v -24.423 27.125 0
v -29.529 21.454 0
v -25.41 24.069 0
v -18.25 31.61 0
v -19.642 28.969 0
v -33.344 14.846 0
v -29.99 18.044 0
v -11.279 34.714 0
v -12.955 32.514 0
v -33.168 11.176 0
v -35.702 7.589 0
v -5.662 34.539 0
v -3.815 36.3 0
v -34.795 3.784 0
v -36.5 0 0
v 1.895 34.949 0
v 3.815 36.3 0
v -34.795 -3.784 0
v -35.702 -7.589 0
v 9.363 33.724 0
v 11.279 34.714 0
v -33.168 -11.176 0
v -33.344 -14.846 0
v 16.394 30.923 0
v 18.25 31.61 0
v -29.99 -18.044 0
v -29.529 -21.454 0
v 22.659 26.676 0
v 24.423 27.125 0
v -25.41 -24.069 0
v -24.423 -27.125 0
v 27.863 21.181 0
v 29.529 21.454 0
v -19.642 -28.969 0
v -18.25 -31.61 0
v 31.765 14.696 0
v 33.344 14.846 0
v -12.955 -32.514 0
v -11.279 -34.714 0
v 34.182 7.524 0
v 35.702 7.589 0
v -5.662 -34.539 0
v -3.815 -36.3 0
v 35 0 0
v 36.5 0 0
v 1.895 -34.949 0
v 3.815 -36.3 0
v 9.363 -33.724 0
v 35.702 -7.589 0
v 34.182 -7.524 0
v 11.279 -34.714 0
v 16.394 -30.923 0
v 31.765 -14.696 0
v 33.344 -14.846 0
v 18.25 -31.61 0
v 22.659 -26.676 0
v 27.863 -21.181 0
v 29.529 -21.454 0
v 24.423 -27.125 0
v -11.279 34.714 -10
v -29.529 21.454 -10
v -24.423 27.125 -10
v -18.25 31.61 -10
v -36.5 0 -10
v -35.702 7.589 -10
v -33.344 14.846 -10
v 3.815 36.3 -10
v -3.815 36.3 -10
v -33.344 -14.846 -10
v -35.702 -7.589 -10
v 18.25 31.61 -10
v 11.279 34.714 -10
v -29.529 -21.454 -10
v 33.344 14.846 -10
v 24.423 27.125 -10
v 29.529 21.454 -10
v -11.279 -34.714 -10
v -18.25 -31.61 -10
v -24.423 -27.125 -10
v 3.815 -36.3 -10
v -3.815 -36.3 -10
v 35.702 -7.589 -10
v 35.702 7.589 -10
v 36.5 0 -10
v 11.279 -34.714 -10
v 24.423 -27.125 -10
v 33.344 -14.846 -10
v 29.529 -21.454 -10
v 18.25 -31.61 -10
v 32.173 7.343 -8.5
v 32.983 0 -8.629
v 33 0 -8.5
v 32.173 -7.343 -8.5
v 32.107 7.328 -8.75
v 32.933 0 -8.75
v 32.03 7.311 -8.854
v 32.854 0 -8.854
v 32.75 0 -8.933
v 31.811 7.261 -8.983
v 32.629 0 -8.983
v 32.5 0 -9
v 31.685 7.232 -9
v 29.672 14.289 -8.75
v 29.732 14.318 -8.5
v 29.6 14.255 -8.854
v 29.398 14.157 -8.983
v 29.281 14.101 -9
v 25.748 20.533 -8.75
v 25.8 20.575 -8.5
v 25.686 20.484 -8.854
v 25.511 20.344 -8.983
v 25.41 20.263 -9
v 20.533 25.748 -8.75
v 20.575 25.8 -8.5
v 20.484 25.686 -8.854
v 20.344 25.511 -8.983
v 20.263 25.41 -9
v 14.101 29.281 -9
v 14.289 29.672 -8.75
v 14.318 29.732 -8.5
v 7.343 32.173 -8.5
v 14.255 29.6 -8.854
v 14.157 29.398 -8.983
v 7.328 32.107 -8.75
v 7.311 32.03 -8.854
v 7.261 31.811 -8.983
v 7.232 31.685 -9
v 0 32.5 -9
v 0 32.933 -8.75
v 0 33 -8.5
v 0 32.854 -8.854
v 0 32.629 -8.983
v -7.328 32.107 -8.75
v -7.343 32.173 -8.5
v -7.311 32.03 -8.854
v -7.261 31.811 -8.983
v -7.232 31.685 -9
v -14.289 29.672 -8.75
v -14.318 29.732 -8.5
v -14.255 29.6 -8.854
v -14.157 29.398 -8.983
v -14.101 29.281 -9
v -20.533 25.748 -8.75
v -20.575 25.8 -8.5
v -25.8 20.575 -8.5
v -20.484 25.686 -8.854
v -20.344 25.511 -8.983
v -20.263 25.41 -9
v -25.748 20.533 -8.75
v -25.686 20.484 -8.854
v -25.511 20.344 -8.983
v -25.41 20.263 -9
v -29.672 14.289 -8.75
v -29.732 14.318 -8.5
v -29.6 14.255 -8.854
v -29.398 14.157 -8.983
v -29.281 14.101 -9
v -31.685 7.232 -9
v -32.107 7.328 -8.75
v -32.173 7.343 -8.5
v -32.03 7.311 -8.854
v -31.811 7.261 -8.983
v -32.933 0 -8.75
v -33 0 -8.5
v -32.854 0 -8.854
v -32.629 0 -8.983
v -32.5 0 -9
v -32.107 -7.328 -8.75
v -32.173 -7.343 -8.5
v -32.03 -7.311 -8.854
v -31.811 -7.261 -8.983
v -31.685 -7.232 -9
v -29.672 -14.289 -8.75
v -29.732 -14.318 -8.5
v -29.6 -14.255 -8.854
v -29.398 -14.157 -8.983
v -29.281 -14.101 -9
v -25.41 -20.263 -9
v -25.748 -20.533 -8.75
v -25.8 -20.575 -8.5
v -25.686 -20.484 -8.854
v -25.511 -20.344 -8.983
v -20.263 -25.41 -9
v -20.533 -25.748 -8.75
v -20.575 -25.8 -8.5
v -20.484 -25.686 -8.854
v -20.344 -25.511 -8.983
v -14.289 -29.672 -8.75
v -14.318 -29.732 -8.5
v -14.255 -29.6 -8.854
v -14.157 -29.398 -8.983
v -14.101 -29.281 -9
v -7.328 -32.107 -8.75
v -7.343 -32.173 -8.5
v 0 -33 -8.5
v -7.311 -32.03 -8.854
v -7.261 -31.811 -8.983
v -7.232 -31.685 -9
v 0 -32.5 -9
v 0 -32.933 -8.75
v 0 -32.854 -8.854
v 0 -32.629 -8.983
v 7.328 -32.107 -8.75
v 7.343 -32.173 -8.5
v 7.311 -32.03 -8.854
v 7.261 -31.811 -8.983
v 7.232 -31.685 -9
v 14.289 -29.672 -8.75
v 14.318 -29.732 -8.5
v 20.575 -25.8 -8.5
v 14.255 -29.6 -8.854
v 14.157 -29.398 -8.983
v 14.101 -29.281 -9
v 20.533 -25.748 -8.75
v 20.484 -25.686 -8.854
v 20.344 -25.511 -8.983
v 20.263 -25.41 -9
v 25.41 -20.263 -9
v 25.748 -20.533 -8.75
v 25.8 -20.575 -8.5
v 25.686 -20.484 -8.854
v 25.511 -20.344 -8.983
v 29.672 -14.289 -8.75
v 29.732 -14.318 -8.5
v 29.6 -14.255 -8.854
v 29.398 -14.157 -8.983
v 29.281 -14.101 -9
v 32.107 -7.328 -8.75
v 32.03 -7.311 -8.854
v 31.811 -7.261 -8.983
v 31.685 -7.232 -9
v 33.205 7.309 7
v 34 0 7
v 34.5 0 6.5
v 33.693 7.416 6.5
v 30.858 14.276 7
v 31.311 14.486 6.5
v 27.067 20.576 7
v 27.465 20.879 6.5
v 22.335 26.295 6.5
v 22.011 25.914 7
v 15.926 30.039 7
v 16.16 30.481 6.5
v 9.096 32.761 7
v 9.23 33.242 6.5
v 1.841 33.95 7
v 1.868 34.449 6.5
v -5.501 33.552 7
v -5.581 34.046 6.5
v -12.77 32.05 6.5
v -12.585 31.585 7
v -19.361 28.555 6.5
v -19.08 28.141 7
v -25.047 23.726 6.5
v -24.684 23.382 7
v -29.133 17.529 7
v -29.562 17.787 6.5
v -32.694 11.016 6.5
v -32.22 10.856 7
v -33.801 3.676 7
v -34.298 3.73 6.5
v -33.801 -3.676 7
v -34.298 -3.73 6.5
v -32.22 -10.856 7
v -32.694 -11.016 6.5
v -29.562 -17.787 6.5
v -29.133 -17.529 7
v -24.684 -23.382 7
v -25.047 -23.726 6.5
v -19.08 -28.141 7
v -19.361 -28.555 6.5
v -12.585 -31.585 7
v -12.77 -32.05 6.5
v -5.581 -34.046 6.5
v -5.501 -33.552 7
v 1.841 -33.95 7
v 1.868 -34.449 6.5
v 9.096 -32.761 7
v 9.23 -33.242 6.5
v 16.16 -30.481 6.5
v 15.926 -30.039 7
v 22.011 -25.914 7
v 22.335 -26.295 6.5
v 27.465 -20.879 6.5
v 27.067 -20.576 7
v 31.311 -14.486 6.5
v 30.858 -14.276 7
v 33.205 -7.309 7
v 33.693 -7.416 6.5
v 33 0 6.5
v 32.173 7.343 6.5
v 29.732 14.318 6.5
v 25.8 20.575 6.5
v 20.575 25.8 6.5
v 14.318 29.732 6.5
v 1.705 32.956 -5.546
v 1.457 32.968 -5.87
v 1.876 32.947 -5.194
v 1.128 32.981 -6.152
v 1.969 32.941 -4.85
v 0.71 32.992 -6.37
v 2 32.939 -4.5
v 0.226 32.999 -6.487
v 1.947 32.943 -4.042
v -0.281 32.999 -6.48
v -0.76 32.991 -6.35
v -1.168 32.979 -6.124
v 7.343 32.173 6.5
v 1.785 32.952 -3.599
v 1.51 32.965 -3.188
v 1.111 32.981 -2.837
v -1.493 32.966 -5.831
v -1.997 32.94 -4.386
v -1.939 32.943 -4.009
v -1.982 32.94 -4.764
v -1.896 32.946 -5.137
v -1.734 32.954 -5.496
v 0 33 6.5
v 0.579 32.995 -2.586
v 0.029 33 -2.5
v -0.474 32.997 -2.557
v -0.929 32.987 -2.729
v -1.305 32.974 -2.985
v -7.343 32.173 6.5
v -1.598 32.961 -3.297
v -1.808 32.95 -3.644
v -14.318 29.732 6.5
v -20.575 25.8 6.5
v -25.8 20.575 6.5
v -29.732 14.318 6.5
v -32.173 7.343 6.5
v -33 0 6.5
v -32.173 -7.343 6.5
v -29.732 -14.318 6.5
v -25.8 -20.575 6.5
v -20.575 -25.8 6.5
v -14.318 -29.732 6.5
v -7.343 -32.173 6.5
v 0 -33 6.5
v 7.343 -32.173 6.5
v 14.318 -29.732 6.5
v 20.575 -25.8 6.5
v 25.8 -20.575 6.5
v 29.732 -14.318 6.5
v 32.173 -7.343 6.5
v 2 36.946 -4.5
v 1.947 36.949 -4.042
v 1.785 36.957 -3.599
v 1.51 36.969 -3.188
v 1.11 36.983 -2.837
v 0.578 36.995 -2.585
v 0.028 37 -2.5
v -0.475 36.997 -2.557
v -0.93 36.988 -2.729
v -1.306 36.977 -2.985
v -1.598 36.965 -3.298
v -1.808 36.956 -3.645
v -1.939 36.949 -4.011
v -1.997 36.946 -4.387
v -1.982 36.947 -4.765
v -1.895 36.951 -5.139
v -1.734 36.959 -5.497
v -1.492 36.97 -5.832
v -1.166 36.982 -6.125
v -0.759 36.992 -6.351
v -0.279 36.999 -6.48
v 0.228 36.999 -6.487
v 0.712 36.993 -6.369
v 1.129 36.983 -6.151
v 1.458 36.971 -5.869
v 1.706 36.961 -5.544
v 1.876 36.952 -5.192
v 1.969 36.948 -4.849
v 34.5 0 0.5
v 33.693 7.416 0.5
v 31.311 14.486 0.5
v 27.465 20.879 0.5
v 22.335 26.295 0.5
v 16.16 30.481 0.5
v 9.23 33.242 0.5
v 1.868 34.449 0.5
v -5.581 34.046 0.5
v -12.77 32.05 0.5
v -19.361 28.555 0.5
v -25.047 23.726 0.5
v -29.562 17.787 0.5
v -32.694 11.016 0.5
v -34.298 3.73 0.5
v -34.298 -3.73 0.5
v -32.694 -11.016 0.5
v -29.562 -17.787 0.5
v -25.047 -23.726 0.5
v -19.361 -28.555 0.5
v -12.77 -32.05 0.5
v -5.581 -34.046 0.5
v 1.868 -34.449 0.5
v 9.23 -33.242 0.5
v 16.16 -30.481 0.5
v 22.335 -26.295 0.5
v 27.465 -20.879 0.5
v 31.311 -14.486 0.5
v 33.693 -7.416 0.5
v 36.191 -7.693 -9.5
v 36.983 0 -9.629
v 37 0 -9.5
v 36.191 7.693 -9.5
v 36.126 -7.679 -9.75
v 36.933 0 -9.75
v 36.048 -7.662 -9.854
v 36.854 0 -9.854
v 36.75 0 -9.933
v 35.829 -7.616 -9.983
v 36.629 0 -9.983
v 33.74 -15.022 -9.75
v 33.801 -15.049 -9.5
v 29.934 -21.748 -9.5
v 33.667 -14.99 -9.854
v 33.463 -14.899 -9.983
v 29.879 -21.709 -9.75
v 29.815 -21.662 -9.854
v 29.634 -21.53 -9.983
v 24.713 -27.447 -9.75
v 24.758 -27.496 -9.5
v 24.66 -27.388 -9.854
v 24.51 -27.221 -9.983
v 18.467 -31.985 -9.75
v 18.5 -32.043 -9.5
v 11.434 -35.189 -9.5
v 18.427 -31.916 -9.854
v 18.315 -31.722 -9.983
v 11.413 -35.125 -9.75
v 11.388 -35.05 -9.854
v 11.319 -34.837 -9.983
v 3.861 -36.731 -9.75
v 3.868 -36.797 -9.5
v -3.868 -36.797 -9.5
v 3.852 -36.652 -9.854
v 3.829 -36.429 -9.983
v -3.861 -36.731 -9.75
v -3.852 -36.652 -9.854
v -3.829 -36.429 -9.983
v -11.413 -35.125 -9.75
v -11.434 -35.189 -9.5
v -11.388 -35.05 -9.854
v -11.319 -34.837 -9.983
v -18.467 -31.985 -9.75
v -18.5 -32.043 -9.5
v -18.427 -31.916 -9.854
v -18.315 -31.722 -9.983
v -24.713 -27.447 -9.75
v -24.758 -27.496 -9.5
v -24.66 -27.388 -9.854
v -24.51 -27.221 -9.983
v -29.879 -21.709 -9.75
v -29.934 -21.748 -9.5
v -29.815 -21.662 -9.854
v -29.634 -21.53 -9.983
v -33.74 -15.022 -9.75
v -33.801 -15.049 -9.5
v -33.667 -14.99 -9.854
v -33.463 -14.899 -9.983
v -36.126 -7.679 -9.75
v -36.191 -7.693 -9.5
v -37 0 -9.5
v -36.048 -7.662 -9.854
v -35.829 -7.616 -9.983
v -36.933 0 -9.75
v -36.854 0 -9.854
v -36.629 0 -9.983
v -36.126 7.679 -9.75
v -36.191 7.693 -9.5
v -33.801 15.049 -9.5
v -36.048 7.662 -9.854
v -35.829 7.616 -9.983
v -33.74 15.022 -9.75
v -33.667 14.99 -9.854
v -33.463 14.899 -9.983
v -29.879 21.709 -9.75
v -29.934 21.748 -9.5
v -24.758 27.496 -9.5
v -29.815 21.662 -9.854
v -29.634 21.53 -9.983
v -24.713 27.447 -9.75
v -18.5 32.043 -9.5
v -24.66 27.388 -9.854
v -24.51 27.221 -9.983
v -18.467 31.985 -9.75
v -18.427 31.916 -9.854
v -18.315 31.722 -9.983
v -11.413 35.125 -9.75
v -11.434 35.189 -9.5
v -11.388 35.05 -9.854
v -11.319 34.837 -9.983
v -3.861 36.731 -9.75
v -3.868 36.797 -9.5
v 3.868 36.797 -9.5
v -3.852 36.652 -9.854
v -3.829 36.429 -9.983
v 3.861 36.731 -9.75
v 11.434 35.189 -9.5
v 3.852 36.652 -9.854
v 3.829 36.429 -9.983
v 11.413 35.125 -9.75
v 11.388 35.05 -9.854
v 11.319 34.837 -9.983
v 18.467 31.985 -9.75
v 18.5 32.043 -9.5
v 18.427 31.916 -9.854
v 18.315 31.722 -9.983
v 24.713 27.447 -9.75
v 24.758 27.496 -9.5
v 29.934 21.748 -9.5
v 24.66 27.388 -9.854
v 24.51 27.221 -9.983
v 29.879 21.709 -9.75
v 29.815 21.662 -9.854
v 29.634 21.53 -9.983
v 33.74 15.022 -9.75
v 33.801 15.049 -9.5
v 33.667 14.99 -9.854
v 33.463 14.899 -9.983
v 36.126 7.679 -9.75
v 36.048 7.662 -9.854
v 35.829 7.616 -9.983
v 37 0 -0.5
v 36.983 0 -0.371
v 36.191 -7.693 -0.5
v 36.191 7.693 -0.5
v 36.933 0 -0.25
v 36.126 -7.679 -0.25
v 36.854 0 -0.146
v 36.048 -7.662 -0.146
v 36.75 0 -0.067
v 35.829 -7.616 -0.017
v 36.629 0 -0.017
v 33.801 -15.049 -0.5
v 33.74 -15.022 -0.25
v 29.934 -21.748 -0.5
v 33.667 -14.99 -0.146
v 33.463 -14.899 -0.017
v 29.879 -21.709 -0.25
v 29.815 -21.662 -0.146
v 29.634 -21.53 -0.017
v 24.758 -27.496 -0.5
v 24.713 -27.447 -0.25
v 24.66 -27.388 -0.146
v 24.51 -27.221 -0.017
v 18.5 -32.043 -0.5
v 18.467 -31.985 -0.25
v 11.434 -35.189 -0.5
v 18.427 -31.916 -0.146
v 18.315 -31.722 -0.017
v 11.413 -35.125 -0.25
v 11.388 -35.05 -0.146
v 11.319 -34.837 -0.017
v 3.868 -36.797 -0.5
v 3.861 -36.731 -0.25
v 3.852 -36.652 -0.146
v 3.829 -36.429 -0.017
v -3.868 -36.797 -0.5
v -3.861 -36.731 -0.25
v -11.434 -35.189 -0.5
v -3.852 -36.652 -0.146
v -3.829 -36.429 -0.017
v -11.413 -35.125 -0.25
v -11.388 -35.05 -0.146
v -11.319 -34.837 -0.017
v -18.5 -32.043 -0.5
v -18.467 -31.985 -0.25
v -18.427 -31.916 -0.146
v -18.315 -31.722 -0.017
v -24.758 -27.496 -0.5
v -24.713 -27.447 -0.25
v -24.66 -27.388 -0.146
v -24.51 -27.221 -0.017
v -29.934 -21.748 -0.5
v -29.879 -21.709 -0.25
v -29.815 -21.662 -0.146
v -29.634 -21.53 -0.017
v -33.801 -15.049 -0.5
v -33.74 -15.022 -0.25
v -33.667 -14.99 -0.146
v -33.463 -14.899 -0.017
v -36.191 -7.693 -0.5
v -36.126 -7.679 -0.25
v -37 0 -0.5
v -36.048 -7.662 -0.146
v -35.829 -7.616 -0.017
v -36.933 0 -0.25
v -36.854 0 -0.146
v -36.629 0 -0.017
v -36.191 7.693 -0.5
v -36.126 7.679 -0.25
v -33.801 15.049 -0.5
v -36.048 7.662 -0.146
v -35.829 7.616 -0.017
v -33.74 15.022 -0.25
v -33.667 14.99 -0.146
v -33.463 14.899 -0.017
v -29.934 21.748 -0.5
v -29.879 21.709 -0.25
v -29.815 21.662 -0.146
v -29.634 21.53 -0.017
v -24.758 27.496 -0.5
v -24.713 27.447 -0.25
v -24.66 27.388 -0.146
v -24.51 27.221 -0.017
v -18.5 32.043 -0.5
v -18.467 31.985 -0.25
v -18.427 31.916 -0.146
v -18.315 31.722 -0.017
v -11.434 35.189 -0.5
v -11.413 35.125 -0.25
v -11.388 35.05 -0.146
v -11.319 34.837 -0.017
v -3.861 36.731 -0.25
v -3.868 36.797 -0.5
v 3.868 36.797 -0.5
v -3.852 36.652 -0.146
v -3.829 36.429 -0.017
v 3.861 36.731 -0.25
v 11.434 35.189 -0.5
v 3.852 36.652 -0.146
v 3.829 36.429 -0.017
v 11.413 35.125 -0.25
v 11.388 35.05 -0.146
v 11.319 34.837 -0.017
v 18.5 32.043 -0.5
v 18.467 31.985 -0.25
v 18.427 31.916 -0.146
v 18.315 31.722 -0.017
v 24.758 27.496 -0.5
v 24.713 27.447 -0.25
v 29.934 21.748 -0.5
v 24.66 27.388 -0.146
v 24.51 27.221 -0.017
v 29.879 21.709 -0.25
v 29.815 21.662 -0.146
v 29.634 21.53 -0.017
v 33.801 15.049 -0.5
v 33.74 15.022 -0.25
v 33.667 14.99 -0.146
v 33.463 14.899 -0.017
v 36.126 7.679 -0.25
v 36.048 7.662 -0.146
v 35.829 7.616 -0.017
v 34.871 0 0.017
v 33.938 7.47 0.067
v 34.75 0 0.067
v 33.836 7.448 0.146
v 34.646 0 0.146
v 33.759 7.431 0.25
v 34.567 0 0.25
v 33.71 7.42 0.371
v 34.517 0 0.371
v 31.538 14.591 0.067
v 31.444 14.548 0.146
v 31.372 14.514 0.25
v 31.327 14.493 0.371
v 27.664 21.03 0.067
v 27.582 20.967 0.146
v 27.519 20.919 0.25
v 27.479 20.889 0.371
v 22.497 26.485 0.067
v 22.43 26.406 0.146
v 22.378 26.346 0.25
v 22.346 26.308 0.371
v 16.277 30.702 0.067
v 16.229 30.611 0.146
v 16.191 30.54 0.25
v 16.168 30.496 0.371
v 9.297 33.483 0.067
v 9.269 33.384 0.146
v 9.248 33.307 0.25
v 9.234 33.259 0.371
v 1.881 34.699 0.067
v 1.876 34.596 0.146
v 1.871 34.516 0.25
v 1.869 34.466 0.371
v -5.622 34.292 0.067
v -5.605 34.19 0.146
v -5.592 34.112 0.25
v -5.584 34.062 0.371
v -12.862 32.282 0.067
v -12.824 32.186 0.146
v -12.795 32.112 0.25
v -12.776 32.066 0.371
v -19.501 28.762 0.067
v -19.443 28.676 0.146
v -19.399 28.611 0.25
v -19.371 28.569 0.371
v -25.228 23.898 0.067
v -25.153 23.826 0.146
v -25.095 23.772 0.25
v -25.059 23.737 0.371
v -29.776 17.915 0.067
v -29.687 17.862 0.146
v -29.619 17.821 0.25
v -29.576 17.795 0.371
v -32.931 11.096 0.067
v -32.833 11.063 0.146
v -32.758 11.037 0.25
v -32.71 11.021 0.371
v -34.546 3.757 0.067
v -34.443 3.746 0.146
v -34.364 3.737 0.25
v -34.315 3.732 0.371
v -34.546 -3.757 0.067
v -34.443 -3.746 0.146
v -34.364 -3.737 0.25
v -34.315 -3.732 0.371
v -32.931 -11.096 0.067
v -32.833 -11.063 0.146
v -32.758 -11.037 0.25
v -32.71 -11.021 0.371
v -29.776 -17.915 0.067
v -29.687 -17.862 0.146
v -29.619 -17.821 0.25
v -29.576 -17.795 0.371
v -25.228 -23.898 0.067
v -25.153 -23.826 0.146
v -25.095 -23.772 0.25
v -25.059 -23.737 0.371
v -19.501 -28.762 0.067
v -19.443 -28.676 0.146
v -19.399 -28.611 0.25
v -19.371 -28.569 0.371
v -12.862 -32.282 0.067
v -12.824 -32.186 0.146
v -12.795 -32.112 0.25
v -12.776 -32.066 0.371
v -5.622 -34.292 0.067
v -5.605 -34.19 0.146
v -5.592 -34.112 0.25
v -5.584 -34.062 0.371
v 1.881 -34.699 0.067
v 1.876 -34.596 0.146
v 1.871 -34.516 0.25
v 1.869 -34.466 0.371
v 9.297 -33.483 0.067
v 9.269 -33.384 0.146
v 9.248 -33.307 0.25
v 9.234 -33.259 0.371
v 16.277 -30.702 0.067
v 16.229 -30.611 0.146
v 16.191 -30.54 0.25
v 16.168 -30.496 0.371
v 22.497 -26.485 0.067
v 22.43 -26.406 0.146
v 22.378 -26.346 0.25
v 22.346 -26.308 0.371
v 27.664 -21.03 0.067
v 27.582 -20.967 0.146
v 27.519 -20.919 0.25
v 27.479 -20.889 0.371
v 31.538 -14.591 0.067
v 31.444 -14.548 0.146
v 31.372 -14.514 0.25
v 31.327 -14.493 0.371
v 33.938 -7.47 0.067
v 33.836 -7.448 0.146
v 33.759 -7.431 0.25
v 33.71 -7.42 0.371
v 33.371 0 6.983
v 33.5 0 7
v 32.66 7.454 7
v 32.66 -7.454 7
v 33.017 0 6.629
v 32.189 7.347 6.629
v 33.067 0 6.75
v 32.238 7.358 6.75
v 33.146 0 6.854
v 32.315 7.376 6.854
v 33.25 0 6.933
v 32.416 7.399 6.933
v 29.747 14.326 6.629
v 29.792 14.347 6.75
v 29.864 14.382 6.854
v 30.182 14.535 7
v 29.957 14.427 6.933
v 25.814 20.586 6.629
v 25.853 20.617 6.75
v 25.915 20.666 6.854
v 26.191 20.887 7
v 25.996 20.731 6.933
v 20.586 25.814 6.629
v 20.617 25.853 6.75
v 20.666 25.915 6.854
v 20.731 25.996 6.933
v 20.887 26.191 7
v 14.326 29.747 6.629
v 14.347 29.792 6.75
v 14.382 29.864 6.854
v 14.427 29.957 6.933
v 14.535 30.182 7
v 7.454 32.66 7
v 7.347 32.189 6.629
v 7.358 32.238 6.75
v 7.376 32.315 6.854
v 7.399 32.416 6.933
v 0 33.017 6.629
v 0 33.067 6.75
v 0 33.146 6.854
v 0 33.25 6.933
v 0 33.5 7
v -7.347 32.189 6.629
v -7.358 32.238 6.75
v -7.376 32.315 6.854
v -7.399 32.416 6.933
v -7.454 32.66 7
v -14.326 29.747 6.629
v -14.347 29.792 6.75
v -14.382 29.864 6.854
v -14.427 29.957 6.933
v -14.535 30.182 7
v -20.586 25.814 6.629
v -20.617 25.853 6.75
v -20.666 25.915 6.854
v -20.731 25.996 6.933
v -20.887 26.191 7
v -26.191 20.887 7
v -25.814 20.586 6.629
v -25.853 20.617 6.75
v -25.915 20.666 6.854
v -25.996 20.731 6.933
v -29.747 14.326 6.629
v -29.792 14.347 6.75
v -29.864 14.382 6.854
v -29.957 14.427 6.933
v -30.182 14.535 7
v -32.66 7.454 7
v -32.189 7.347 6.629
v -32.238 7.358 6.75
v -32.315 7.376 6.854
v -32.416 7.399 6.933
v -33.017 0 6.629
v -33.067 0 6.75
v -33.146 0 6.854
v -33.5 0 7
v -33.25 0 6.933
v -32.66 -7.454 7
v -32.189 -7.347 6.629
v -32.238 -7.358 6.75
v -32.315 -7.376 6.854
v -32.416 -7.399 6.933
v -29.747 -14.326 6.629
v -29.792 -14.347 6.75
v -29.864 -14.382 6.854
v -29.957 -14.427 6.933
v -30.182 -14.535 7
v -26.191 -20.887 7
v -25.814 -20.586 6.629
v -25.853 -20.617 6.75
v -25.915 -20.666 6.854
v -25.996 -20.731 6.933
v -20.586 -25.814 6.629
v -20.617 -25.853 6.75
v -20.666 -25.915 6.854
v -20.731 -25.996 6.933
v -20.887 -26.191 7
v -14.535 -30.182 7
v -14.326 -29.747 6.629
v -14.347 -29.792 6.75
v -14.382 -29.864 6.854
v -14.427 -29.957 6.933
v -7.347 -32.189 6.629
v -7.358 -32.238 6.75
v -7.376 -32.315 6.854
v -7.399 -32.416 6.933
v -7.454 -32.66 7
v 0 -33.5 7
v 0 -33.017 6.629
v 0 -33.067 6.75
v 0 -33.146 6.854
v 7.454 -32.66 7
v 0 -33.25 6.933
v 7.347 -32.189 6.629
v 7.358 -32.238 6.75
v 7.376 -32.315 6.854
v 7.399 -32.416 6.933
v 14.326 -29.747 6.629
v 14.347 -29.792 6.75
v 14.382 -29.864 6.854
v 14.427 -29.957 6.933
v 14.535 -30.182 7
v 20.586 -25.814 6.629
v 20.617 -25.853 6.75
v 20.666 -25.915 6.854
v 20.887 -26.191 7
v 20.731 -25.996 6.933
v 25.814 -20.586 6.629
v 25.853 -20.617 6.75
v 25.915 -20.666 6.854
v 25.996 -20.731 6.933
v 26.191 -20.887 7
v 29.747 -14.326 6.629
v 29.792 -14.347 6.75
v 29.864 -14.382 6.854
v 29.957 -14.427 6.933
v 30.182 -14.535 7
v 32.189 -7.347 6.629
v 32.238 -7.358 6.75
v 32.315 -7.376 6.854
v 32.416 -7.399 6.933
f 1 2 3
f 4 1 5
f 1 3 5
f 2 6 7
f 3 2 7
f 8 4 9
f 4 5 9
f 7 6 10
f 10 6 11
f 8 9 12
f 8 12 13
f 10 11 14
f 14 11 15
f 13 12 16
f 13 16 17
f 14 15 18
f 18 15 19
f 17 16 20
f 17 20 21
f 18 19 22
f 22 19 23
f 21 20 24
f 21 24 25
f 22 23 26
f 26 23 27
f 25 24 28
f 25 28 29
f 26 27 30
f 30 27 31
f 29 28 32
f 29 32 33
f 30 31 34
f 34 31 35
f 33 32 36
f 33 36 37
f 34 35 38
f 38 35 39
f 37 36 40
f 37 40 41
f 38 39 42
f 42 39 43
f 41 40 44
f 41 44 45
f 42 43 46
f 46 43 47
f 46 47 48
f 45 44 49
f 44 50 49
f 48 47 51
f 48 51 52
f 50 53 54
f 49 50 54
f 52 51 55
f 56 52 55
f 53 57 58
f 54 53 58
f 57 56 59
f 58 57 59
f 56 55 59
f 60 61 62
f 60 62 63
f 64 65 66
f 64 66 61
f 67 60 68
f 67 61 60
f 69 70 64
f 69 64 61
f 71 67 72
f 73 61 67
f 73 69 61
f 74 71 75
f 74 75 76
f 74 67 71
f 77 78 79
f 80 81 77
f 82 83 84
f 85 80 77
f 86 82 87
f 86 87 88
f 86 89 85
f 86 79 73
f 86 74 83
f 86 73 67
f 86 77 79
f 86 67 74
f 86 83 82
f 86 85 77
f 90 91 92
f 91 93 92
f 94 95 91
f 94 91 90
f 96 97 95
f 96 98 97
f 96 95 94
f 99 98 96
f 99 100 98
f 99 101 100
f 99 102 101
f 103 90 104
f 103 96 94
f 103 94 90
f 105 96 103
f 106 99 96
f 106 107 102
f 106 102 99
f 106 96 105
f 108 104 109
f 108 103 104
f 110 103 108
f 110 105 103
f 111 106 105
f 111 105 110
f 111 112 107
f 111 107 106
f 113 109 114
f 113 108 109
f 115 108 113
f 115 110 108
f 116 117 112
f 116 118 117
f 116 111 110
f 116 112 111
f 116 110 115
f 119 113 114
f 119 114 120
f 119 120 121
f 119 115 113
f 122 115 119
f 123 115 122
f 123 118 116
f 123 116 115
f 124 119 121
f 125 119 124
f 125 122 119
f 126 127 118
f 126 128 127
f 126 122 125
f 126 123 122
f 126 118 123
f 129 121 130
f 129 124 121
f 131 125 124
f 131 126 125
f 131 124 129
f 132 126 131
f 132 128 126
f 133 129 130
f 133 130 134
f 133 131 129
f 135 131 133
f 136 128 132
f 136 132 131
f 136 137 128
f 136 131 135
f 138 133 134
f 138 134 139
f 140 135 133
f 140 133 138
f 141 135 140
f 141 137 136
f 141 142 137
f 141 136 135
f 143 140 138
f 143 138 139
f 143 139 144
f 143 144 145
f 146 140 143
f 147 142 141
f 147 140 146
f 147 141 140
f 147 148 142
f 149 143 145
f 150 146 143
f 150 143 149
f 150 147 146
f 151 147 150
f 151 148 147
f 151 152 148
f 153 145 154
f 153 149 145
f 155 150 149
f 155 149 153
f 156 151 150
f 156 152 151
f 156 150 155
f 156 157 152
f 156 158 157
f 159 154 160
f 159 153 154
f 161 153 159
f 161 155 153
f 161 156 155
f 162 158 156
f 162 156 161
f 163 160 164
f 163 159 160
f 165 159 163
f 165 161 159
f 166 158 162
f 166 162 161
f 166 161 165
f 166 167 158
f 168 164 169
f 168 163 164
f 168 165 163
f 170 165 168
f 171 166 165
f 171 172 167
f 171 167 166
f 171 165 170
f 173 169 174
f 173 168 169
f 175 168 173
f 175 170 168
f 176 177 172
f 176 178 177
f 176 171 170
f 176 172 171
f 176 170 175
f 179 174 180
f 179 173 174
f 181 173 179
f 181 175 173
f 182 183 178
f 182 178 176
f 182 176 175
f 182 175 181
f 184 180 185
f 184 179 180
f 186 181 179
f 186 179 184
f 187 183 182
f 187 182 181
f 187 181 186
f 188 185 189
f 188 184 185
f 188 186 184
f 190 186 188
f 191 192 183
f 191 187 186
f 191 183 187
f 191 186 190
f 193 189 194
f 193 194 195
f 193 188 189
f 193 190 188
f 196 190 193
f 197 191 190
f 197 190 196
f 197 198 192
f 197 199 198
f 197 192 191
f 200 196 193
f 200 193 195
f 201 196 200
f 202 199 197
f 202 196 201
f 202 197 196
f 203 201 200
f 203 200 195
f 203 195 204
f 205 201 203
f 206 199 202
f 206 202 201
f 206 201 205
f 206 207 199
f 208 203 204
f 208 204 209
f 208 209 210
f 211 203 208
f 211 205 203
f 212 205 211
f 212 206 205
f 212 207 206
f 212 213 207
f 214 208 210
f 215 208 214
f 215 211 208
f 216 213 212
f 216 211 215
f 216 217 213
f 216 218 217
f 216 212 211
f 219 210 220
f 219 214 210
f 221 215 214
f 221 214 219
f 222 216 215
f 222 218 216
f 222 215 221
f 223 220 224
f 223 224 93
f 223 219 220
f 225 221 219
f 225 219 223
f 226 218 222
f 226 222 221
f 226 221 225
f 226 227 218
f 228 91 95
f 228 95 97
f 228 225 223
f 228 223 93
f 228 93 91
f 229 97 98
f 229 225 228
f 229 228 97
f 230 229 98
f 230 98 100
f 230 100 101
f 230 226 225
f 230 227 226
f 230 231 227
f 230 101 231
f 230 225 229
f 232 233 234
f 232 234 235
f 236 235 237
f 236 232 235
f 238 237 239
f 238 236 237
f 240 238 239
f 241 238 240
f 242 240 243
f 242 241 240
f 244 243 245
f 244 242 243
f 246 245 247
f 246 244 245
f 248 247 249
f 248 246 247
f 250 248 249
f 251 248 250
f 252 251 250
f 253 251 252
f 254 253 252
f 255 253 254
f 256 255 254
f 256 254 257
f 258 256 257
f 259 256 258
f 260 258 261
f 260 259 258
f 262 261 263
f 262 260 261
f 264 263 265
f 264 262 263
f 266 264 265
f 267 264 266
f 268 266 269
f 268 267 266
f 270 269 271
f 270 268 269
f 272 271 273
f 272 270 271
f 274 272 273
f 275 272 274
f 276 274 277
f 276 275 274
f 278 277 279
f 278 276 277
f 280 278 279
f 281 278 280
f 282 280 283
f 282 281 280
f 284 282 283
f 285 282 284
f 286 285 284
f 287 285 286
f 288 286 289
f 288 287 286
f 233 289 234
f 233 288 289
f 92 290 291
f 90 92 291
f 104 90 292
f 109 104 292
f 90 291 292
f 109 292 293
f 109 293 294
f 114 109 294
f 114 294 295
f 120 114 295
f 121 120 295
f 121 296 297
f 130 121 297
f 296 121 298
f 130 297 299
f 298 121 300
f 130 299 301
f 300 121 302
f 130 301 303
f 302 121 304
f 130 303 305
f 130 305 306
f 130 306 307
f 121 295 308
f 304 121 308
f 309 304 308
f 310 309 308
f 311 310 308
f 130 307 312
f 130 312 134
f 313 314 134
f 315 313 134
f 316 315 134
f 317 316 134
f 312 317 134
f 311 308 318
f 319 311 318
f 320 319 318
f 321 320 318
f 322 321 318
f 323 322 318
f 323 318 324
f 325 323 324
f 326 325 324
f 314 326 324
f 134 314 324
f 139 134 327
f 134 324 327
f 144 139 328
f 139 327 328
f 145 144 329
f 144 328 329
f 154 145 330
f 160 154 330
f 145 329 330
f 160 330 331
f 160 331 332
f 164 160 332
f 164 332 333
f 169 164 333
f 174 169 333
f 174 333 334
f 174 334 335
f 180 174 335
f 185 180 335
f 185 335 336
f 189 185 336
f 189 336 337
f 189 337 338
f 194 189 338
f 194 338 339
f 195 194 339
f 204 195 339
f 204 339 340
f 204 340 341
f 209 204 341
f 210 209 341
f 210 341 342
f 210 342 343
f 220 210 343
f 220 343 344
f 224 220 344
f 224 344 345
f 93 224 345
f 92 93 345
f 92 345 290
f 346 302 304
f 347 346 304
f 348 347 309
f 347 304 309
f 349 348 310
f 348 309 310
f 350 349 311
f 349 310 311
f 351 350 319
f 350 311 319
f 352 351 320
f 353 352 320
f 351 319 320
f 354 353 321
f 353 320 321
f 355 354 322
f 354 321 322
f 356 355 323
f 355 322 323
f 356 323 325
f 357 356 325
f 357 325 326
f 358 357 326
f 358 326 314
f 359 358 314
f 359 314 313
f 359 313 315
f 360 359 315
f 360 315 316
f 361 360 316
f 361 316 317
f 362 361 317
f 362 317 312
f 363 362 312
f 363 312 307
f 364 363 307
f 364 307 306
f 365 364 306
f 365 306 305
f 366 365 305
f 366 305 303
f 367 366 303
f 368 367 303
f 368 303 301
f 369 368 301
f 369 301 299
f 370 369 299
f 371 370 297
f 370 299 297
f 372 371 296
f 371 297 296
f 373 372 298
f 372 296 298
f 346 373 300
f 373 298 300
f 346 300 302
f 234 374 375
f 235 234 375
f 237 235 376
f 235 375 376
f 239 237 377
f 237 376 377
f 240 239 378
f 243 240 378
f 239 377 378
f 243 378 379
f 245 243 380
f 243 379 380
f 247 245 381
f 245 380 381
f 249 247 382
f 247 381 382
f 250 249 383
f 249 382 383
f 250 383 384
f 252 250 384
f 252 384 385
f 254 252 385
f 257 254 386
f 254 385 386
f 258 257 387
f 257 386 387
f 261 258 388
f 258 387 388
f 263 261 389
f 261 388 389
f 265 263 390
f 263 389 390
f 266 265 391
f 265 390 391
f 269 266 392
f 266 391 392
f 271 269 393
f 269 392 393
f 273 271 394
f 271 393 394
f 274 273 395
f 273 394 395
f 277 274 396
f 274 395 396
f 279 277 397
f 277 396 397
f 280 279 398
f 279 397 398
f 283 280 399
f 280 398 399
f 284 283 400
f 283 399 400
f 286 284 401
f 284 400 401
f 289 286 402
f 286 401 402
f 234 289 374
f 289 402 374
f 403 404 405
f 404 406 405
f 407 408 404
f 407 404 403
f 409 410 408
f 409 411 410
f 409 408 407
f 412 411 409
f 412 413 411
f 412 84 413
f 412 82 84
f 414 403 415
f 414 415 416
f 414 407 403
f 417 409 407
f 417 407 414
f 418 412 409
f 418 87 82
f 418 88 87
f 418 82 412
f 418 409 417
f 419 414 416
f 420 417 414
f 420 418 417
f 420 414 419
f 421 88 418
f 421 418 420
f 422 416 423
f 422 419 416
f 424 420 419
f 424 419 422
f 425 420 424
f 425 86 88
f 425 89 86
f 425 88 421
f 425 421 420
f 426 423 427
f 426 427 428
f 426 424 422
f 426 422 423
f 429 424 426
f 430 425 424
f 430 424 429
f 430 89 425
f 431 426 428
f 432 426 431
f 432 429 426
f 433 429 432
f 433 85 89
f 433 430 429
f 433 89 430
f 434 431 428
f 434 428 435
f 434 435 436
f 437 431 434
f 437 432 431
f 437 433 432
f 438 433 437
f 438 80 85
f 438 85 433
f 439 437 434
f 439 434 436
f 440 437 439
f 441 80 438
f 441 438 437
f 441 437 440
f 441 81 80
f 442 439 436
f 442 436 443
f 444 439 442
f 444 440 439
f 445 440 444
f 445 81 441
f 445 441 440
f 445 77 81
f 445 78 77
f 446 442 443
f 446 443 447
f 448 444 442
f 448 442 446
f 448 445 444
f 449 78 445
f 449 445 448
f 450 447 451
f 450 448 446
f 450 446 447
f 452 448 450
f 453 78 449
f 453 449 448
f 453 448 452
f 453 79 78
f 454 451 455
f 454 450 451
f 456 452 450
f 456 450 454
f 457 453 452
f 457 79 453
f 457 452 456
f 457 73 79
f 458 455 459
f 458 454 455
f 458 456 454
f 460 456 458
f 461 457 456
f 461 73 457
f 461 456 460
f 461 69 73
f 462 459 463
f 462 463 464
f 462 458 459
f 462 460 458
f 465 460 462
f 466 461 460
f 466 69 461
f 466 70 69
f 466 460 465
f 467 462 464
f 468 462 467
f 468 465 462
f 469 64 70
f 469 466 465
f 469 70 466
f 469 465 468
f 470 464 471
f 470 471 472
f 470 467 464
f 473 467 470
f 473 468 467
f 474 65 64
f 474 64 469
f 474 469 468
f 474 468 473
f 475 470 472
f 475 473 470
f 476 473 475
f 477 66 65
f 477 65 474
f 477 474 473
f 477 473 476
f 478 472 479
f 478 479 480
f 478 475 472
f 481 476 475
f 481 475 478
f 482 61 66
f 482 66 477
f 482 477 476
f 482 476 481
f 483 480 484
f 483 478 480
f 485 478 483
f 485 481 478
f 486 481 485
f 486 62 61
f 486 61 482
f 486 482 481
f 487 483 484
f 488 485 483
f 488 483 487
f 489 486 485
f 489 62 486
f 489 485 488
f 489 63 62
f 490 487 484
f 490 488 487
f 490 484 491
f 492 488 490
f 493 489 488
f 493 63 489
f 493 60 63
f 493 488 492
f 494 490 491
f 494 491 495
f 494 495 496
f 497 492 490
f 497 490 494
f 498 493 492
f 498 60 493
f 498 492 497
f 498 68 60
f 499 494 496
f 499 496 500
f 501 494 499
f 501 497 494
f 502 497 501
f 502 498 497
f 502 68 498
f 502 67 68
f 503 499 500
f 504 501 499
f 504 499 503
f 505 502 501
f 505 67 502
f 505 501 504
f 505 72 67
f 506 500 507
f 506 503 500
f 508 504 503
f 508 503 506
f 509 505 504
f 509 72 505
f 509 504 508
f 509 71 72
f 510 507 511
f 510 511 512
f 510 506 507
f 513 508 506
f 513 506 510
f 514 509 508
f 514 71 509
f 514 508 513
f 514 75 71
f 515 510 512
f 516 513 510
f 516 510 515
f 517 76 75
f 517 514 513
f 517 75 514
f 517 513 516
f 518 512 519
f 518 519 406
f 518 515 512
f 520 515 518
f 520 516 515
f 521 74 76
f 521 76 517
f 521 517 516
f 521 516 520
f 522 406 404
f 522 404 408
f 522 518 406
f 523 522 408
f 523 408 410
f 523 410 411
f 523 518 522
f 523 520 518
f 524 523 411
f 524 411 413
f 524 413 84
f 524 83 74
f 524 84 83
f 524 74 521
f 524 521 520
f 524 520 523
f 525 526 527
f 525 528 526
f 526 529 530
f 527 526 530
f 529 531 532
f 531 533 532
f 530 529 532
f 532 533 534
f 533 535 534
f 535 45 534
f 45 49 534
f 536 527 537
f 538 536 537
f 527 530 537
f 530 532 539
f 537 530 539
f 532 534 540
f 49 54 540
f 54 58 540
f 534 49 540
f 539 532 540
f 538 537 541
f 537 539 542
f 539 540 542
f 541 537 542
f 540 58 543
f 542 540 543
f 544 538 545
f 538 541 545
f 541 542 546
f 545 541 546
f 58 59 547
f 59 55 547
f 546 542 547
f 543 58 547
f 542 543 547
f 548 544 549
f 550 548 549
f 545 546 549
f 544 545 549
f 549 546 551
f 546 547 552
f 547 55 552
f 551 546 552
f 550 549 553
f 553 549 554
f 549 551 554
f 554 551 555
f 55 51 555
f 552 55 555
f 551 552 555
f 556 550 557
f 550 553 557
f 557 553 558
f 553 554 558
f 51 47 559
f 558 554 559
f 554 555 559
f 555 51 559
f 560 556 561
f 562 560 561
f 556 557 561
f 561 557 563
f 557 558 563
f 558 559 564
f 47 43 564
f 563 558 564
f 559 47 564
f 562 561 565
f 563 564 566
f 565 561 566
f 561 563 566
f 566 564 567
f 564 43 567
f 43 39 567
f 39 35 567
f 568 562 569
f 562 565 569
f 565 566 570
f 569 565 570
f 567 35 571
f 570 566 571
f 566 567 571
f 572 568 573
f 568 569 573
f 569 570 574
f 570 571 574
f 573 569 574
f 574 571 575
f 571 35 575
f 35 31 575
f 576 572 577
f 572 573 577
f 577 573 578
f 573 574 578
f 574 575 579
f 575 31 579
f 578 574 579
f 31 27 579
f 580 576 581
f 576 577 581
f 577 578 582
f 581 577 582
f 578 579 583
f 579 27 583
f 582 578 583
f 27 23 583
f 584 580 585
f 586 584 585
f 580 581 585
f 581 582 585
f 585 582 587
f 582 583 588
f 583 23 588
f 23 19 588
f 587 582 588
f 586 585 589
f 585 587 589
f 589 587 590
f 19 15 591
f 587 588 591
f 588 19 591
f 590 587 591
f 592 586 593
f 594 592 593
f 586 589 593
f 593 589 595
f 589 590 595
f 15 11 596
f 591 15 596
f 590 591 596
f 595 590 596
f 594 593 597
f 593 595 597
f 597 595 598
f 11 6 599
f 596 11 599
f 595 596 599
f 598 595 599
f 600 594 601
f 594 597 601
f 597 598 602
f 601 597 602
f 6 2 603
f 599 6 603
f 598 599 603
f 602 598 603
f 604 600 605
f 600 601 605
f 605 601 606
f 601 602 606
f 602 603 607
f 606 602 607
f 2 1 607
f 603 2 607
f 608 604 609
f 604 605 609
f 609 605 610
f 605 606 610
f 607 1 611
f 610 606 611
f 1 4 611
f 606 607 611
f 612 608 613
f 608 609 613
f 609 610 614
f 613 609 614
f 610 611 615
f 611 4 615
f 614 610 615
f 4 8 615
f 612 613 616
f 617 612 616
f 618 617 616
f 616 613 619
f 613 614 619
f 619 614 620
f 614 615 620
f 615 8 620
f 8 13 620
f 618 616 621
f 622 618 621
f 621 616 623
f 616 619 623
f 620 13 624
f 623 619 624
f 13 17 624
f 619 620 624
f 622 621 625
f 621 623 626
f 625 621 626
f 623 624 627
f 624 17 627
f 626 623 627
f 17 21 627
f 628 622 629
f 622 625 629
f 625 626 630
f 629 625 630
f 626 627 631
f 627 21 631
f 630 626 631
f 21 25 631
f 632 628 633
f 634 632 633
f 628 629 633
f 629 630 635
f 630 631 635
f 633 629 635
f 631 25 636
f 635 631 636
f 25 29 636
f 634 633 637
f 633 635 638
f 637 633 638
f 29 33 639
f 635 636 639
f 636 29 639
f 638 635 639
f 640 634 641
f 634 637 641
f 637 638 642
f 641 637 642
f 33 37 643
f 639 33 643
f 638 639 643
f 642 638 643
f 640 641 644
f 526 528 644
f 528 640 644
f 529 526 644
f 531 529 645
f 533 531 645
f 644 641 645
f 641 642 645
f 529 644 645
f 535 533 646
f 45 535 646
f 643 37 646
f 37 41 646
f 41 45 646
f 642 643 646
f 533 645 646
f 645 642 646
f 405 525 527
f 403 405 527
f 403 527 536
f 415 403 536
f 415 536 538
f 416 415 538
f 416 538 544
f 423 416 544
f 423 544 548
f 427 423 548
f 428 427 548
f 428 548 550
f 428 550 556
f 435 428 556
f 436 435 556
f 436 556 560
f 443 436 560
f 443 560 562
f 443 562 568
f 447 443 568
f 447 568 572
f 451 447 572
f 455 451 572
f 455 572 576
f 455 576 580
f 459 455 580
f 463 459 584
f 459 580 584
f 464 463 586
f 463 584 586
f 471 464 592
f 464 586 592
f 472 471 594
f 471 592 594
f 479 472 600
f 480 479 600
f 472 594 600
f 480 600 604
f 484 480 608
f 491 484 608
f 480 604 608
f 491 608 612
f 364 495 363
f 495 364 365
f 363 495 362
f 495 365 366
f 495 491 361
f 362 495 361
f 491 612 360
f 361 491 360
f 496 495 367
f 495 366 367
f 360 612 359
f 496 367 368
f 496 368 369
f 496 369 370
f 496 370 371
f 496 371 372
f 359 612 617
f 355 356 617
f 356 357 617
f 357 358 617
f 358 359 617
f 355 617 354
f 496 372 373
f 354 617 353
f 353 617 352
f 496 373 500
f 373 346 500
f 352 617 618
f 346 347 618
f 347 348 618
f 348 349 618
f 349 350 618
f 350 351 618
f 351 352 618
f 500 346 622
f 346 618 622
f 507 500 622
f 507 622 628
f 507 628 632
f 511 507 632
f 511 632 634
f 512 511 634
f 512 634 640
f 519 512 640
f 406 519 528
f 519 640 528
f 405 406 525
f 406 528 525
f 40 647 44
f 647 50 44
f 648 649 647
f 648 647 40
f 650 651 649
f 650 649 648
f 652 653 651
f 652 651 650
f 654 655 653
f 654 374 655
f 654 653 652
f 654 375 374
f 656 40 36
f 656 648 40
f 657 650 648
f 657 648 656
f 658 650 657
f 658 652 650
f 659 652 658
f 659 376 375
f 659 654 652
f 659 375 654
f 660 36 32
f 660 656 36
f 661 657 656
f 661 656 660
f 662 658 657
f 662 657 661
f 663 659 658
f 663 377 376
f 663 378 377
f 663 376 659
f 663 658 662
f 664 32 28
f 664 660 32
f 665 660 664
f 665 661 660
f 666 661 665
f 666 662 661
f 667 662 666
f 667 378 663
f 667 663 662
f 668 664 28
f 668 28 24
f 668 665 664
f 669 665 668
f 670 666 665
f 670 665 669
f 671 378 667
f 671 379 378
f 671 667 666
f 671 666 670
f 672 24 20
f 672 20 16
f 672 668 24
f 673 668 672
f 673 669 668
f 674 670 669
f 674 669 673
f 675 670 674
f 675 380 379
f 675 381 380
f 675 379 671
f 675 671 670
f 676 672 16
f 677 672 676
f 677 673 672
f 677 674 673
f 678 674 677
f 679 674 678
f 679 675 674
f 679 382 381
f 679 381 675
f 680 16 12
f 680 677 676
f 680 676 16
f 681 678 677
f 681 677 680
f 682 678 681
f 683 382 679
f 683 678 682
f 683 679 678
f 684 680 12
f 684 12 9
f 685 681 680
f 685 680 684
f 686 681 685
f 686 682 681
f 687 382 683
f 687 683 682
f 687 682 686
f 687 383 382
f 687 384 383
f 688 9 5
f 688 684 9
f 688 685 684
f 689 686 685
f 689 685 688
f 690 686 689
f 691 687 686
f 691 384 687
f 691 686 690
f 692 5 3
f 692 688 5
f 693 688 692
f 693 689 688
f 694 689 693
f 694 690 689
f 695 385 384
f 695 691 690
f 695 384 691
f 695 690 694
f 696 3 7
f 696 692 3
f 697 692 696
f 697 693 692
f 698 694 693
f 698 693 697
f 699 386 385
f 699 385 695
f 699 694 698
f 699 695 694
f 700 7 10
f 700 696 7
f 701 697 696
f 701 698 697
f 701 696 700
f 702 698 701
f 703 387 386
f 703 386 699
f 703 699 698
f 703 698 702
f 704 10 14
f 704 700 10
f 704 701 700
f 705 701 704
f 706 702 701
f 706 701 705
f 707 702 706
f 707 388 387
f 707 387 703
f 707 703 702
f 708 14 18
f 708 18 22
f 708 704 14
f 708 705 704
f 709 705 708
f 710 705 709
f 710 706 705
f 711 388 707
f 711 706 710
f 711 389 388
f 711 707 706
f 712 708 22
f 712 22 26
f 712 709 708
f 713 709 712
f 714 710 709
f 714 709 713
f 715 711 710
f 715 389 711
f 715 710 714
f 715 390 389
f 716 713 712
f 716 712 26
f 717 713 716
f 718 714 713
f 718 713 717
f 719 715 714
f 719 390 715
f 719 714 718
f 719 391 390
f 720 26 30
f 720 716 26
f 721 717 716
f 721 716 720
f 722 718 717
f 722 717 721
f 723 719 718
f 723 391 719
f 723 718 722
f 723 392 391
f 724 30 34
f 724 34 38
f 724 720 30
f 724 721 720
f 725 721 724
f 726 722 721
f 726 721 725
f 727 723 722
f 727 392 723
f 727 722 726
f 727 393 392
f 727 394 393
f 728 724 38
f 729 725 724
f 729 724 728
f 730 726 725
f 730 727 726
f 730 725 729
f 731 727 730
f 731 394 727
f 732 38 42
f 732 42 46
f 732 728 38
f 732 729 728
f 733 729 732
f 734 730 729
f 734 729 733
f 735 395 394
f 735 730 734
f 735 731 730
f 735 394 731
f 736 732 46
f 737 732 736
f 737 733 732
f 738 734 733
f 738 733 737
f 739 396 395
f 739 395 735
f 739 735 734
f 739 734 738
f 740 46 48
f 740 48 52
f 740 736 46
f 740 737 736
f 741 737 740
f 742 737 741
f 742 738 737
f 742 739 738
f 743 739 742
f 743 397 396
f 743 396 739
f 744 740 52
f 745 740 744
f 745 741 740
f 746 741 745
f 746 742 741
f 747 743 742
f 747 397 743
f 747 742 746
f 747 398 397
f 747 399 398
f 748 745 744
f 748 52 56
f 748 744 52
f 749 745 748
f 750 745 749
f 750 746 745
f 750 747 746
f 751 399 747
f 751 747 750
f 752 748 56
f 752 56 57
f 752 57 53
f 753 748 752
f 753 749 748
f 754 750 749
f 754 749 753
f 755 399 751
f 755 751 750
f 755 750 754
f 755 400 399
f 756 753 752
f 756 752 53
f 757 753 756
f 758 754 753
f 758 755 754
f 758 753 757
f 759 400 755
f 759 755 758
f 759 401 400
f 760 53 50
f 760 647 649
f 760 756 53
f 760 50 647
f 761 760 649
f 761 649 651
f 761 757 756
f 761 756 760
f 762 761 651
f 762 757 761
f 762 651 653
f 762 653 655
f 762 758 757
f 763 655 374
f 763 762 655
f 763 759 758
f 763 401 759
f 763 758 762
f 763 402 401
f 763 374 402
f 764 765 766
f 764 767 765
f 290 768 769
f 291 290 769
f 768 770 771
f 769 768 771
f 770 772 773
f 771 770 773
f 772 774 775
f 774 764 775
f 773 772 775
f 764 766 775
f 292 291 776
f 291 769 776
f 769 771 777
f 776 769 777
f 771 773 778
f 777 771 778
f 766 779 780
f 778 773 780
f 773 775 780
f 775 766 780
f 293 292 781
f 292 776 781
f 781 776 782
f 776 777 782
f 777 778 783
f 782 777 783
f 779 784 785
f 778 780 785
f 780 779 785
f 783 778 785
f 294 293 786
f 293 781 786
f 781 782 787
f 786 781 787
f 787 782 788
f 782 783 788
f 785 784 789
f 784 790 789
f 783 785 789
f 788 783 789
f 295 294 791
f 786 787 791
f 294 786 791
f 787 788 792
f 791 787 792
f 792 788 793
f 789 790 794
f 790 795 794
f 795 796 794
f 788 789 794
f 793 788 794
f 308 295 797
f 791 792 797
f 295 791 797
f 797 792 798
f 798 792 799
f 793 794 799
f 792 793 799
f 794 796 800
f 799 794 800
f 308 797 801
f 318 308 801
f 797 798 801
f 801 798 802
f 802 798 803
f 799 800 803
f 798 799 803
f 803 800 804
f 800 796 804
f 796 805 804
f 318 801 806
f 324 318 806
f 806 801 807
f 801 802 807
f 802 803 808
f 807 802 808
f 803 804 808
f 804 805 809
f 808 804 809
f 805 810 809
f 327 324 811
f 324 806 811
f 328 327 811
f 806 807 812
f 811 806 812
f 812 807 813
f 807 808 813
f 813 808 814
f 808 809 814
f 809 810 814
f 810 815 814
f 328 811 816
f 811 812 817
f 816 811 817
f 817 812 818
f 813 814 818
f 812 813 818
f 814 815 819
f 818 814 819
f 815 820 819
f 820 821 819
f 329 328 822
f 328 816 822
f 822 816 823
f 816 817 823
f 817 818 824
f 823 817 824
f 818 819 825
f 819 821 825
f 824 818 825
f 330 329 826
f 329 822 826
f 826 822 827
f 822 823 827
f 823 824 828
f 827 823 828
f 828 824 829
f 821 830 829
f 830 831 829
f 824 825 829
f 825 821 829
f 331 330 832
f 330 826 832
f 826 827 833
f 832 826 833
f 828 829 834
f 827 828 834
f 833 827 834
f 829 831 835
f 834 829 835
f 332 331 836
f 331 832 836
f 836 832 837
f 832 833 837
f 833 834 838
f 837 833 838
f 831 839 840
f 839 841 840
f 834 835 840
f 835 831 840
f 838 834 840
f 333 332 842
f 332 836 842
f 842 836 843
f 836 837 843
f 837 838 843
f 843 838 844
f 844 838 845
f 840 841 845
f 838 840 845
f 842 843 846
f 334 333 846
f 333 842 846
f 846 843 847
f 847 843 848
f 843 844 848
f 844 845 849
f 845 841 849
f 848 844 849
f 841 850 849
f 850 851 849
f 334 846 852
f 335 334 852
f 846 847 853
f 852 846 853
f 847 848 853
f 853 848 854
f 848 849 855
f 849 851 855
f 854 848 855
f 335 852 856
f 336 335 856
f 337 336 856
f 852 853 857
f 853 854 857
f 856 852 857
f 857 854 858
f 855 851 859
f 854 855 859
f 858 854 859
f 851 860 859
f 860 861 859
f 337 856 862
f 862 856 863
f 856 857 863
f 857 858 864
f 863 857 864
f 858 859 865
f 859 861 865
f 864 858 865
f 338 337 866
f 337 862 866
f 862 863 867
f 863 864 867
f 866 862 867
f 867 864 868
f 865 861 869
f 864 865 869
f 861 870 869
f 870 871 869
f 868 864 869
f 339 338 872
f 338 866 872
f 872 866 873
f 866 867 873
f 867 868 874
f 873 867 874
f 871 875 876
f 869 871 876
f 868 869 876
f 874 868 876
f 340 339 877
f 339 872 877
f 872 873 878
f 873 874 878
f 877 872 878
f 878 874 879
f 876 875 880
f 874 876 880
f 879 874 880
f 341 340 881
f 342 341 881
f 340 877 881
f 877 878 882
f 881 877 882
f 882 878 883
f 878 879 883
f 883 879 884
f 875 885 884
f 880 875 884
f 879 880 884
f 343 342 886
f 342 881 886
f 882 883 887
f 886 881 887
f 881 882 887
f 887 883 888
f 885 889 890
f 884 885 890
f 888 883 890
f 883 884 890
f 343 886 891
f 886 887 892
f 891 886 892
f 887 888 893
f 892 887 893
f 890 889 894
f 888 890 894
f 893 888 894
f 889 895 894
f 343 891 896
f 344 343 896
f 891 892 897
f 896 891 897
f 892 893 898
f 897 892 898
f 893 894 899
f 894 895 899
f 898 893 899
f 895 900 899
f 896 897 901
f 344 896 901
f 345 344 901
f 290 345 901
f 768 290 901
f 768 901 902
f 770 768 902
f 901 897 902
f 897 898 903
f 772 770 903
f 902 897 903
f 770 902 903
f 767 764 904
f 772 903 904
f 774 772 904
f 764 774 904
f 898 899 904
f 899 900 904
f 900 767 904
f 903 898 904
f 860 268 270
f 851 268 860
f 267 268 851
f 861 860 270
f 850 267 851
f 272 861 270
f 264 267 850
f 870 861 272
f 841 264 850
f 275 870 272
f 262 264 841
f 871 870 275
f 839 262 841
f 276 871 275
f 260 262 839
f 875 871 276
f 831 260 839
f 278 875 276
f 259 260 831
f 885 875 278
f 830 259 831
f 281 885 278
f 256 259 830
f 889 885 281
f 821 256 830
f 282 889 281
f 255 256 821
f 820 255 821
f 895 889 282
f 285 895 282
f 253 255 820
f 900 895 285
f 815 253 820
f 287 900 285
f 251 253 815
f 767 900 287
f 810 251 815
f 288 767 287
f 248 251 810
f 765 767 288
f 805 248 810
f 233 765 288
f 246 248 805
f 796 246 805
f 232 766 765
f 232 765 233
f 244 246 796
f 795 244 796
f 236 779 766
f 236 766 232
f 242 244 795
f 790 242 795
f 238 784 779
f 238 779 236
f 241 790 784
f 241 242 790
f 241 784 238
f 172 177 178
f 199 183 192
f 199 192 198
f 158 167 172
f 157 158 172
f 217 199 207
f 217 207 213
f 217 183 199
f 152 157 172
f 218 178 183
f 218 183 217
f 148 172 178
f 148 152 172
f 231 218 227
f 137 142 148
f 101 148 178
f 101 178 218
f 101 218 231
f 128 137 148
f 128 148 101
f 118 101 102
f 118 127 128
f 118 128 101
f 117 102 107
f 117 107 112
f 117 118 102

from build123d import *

# Parameters (mm, degrees)
SKETCH_R        = 34.5
PAD_DEPTH       = 7
SKETCH001_R     = 37
PAD001_DEPTH    = 10
SKETCH002_R     = 33
POCKET_DEPTH    = 16
SKETCH003_R     = 2
POCKET001_DEPTH = 80
FILLET_R        = 0.5
CHAMFER_SIZE    = 0.5


with BuildPart() as part:
    # Sketch → Pad (new body)
    with BuildSketch(Plane.XY):
        Circle(SKETCH_R)
    extrude(amount=PAD_DEPTH)

    # Sketch001 (on Face2 of Pad) → Pad001 (join)
    with BuildSketch(Plane(origin=(0, 0, 0), x_dir=(1, 0, 0), z_dir=(0, 0, -1))):
        Circle(SKETCH001_R)
    extrude(amount=PAD001_DEPTH)

    # Sketch002 (on Face5 of Pad001) → Pocket (cut)
    with BuildSketch(Plane.XY.offset(7)):
        Circle(SKETCH002_R)
    extrude(amount=-POCKET_DEPTH, mode=Mode.SUBTRACT)

    # Sketch003 → Pocket001 (cut)
    with BuildSketch(Plane.XZ):
        with Locations((0, -4.5)):
            Circle(SKETCH003_R)
    extrude(amount=-POCKET001_DEPTH, mode=Mode.SUBTRACT)

    # Fillet
    fillet_edges = [part.edges().sort_by_distance(p)[0] for p in [
        (-33, 0, 7),
        (-34.5, 0, 0),
        (-37, 0, 0),
        (-37, 0, -10),
        (-33, 0, -9),
    ]]
    fillet(fillet_edges, radius=FILLET_R)

    # Chamfer
    chamfer_edges = [part.edges().sort_by_distance(p)[0] for p in [
        (-34.5, 0, 7),
    ]]
    chamfer(chamfer_edges, length=CHAMFER_SIZE)


solid = part.part
